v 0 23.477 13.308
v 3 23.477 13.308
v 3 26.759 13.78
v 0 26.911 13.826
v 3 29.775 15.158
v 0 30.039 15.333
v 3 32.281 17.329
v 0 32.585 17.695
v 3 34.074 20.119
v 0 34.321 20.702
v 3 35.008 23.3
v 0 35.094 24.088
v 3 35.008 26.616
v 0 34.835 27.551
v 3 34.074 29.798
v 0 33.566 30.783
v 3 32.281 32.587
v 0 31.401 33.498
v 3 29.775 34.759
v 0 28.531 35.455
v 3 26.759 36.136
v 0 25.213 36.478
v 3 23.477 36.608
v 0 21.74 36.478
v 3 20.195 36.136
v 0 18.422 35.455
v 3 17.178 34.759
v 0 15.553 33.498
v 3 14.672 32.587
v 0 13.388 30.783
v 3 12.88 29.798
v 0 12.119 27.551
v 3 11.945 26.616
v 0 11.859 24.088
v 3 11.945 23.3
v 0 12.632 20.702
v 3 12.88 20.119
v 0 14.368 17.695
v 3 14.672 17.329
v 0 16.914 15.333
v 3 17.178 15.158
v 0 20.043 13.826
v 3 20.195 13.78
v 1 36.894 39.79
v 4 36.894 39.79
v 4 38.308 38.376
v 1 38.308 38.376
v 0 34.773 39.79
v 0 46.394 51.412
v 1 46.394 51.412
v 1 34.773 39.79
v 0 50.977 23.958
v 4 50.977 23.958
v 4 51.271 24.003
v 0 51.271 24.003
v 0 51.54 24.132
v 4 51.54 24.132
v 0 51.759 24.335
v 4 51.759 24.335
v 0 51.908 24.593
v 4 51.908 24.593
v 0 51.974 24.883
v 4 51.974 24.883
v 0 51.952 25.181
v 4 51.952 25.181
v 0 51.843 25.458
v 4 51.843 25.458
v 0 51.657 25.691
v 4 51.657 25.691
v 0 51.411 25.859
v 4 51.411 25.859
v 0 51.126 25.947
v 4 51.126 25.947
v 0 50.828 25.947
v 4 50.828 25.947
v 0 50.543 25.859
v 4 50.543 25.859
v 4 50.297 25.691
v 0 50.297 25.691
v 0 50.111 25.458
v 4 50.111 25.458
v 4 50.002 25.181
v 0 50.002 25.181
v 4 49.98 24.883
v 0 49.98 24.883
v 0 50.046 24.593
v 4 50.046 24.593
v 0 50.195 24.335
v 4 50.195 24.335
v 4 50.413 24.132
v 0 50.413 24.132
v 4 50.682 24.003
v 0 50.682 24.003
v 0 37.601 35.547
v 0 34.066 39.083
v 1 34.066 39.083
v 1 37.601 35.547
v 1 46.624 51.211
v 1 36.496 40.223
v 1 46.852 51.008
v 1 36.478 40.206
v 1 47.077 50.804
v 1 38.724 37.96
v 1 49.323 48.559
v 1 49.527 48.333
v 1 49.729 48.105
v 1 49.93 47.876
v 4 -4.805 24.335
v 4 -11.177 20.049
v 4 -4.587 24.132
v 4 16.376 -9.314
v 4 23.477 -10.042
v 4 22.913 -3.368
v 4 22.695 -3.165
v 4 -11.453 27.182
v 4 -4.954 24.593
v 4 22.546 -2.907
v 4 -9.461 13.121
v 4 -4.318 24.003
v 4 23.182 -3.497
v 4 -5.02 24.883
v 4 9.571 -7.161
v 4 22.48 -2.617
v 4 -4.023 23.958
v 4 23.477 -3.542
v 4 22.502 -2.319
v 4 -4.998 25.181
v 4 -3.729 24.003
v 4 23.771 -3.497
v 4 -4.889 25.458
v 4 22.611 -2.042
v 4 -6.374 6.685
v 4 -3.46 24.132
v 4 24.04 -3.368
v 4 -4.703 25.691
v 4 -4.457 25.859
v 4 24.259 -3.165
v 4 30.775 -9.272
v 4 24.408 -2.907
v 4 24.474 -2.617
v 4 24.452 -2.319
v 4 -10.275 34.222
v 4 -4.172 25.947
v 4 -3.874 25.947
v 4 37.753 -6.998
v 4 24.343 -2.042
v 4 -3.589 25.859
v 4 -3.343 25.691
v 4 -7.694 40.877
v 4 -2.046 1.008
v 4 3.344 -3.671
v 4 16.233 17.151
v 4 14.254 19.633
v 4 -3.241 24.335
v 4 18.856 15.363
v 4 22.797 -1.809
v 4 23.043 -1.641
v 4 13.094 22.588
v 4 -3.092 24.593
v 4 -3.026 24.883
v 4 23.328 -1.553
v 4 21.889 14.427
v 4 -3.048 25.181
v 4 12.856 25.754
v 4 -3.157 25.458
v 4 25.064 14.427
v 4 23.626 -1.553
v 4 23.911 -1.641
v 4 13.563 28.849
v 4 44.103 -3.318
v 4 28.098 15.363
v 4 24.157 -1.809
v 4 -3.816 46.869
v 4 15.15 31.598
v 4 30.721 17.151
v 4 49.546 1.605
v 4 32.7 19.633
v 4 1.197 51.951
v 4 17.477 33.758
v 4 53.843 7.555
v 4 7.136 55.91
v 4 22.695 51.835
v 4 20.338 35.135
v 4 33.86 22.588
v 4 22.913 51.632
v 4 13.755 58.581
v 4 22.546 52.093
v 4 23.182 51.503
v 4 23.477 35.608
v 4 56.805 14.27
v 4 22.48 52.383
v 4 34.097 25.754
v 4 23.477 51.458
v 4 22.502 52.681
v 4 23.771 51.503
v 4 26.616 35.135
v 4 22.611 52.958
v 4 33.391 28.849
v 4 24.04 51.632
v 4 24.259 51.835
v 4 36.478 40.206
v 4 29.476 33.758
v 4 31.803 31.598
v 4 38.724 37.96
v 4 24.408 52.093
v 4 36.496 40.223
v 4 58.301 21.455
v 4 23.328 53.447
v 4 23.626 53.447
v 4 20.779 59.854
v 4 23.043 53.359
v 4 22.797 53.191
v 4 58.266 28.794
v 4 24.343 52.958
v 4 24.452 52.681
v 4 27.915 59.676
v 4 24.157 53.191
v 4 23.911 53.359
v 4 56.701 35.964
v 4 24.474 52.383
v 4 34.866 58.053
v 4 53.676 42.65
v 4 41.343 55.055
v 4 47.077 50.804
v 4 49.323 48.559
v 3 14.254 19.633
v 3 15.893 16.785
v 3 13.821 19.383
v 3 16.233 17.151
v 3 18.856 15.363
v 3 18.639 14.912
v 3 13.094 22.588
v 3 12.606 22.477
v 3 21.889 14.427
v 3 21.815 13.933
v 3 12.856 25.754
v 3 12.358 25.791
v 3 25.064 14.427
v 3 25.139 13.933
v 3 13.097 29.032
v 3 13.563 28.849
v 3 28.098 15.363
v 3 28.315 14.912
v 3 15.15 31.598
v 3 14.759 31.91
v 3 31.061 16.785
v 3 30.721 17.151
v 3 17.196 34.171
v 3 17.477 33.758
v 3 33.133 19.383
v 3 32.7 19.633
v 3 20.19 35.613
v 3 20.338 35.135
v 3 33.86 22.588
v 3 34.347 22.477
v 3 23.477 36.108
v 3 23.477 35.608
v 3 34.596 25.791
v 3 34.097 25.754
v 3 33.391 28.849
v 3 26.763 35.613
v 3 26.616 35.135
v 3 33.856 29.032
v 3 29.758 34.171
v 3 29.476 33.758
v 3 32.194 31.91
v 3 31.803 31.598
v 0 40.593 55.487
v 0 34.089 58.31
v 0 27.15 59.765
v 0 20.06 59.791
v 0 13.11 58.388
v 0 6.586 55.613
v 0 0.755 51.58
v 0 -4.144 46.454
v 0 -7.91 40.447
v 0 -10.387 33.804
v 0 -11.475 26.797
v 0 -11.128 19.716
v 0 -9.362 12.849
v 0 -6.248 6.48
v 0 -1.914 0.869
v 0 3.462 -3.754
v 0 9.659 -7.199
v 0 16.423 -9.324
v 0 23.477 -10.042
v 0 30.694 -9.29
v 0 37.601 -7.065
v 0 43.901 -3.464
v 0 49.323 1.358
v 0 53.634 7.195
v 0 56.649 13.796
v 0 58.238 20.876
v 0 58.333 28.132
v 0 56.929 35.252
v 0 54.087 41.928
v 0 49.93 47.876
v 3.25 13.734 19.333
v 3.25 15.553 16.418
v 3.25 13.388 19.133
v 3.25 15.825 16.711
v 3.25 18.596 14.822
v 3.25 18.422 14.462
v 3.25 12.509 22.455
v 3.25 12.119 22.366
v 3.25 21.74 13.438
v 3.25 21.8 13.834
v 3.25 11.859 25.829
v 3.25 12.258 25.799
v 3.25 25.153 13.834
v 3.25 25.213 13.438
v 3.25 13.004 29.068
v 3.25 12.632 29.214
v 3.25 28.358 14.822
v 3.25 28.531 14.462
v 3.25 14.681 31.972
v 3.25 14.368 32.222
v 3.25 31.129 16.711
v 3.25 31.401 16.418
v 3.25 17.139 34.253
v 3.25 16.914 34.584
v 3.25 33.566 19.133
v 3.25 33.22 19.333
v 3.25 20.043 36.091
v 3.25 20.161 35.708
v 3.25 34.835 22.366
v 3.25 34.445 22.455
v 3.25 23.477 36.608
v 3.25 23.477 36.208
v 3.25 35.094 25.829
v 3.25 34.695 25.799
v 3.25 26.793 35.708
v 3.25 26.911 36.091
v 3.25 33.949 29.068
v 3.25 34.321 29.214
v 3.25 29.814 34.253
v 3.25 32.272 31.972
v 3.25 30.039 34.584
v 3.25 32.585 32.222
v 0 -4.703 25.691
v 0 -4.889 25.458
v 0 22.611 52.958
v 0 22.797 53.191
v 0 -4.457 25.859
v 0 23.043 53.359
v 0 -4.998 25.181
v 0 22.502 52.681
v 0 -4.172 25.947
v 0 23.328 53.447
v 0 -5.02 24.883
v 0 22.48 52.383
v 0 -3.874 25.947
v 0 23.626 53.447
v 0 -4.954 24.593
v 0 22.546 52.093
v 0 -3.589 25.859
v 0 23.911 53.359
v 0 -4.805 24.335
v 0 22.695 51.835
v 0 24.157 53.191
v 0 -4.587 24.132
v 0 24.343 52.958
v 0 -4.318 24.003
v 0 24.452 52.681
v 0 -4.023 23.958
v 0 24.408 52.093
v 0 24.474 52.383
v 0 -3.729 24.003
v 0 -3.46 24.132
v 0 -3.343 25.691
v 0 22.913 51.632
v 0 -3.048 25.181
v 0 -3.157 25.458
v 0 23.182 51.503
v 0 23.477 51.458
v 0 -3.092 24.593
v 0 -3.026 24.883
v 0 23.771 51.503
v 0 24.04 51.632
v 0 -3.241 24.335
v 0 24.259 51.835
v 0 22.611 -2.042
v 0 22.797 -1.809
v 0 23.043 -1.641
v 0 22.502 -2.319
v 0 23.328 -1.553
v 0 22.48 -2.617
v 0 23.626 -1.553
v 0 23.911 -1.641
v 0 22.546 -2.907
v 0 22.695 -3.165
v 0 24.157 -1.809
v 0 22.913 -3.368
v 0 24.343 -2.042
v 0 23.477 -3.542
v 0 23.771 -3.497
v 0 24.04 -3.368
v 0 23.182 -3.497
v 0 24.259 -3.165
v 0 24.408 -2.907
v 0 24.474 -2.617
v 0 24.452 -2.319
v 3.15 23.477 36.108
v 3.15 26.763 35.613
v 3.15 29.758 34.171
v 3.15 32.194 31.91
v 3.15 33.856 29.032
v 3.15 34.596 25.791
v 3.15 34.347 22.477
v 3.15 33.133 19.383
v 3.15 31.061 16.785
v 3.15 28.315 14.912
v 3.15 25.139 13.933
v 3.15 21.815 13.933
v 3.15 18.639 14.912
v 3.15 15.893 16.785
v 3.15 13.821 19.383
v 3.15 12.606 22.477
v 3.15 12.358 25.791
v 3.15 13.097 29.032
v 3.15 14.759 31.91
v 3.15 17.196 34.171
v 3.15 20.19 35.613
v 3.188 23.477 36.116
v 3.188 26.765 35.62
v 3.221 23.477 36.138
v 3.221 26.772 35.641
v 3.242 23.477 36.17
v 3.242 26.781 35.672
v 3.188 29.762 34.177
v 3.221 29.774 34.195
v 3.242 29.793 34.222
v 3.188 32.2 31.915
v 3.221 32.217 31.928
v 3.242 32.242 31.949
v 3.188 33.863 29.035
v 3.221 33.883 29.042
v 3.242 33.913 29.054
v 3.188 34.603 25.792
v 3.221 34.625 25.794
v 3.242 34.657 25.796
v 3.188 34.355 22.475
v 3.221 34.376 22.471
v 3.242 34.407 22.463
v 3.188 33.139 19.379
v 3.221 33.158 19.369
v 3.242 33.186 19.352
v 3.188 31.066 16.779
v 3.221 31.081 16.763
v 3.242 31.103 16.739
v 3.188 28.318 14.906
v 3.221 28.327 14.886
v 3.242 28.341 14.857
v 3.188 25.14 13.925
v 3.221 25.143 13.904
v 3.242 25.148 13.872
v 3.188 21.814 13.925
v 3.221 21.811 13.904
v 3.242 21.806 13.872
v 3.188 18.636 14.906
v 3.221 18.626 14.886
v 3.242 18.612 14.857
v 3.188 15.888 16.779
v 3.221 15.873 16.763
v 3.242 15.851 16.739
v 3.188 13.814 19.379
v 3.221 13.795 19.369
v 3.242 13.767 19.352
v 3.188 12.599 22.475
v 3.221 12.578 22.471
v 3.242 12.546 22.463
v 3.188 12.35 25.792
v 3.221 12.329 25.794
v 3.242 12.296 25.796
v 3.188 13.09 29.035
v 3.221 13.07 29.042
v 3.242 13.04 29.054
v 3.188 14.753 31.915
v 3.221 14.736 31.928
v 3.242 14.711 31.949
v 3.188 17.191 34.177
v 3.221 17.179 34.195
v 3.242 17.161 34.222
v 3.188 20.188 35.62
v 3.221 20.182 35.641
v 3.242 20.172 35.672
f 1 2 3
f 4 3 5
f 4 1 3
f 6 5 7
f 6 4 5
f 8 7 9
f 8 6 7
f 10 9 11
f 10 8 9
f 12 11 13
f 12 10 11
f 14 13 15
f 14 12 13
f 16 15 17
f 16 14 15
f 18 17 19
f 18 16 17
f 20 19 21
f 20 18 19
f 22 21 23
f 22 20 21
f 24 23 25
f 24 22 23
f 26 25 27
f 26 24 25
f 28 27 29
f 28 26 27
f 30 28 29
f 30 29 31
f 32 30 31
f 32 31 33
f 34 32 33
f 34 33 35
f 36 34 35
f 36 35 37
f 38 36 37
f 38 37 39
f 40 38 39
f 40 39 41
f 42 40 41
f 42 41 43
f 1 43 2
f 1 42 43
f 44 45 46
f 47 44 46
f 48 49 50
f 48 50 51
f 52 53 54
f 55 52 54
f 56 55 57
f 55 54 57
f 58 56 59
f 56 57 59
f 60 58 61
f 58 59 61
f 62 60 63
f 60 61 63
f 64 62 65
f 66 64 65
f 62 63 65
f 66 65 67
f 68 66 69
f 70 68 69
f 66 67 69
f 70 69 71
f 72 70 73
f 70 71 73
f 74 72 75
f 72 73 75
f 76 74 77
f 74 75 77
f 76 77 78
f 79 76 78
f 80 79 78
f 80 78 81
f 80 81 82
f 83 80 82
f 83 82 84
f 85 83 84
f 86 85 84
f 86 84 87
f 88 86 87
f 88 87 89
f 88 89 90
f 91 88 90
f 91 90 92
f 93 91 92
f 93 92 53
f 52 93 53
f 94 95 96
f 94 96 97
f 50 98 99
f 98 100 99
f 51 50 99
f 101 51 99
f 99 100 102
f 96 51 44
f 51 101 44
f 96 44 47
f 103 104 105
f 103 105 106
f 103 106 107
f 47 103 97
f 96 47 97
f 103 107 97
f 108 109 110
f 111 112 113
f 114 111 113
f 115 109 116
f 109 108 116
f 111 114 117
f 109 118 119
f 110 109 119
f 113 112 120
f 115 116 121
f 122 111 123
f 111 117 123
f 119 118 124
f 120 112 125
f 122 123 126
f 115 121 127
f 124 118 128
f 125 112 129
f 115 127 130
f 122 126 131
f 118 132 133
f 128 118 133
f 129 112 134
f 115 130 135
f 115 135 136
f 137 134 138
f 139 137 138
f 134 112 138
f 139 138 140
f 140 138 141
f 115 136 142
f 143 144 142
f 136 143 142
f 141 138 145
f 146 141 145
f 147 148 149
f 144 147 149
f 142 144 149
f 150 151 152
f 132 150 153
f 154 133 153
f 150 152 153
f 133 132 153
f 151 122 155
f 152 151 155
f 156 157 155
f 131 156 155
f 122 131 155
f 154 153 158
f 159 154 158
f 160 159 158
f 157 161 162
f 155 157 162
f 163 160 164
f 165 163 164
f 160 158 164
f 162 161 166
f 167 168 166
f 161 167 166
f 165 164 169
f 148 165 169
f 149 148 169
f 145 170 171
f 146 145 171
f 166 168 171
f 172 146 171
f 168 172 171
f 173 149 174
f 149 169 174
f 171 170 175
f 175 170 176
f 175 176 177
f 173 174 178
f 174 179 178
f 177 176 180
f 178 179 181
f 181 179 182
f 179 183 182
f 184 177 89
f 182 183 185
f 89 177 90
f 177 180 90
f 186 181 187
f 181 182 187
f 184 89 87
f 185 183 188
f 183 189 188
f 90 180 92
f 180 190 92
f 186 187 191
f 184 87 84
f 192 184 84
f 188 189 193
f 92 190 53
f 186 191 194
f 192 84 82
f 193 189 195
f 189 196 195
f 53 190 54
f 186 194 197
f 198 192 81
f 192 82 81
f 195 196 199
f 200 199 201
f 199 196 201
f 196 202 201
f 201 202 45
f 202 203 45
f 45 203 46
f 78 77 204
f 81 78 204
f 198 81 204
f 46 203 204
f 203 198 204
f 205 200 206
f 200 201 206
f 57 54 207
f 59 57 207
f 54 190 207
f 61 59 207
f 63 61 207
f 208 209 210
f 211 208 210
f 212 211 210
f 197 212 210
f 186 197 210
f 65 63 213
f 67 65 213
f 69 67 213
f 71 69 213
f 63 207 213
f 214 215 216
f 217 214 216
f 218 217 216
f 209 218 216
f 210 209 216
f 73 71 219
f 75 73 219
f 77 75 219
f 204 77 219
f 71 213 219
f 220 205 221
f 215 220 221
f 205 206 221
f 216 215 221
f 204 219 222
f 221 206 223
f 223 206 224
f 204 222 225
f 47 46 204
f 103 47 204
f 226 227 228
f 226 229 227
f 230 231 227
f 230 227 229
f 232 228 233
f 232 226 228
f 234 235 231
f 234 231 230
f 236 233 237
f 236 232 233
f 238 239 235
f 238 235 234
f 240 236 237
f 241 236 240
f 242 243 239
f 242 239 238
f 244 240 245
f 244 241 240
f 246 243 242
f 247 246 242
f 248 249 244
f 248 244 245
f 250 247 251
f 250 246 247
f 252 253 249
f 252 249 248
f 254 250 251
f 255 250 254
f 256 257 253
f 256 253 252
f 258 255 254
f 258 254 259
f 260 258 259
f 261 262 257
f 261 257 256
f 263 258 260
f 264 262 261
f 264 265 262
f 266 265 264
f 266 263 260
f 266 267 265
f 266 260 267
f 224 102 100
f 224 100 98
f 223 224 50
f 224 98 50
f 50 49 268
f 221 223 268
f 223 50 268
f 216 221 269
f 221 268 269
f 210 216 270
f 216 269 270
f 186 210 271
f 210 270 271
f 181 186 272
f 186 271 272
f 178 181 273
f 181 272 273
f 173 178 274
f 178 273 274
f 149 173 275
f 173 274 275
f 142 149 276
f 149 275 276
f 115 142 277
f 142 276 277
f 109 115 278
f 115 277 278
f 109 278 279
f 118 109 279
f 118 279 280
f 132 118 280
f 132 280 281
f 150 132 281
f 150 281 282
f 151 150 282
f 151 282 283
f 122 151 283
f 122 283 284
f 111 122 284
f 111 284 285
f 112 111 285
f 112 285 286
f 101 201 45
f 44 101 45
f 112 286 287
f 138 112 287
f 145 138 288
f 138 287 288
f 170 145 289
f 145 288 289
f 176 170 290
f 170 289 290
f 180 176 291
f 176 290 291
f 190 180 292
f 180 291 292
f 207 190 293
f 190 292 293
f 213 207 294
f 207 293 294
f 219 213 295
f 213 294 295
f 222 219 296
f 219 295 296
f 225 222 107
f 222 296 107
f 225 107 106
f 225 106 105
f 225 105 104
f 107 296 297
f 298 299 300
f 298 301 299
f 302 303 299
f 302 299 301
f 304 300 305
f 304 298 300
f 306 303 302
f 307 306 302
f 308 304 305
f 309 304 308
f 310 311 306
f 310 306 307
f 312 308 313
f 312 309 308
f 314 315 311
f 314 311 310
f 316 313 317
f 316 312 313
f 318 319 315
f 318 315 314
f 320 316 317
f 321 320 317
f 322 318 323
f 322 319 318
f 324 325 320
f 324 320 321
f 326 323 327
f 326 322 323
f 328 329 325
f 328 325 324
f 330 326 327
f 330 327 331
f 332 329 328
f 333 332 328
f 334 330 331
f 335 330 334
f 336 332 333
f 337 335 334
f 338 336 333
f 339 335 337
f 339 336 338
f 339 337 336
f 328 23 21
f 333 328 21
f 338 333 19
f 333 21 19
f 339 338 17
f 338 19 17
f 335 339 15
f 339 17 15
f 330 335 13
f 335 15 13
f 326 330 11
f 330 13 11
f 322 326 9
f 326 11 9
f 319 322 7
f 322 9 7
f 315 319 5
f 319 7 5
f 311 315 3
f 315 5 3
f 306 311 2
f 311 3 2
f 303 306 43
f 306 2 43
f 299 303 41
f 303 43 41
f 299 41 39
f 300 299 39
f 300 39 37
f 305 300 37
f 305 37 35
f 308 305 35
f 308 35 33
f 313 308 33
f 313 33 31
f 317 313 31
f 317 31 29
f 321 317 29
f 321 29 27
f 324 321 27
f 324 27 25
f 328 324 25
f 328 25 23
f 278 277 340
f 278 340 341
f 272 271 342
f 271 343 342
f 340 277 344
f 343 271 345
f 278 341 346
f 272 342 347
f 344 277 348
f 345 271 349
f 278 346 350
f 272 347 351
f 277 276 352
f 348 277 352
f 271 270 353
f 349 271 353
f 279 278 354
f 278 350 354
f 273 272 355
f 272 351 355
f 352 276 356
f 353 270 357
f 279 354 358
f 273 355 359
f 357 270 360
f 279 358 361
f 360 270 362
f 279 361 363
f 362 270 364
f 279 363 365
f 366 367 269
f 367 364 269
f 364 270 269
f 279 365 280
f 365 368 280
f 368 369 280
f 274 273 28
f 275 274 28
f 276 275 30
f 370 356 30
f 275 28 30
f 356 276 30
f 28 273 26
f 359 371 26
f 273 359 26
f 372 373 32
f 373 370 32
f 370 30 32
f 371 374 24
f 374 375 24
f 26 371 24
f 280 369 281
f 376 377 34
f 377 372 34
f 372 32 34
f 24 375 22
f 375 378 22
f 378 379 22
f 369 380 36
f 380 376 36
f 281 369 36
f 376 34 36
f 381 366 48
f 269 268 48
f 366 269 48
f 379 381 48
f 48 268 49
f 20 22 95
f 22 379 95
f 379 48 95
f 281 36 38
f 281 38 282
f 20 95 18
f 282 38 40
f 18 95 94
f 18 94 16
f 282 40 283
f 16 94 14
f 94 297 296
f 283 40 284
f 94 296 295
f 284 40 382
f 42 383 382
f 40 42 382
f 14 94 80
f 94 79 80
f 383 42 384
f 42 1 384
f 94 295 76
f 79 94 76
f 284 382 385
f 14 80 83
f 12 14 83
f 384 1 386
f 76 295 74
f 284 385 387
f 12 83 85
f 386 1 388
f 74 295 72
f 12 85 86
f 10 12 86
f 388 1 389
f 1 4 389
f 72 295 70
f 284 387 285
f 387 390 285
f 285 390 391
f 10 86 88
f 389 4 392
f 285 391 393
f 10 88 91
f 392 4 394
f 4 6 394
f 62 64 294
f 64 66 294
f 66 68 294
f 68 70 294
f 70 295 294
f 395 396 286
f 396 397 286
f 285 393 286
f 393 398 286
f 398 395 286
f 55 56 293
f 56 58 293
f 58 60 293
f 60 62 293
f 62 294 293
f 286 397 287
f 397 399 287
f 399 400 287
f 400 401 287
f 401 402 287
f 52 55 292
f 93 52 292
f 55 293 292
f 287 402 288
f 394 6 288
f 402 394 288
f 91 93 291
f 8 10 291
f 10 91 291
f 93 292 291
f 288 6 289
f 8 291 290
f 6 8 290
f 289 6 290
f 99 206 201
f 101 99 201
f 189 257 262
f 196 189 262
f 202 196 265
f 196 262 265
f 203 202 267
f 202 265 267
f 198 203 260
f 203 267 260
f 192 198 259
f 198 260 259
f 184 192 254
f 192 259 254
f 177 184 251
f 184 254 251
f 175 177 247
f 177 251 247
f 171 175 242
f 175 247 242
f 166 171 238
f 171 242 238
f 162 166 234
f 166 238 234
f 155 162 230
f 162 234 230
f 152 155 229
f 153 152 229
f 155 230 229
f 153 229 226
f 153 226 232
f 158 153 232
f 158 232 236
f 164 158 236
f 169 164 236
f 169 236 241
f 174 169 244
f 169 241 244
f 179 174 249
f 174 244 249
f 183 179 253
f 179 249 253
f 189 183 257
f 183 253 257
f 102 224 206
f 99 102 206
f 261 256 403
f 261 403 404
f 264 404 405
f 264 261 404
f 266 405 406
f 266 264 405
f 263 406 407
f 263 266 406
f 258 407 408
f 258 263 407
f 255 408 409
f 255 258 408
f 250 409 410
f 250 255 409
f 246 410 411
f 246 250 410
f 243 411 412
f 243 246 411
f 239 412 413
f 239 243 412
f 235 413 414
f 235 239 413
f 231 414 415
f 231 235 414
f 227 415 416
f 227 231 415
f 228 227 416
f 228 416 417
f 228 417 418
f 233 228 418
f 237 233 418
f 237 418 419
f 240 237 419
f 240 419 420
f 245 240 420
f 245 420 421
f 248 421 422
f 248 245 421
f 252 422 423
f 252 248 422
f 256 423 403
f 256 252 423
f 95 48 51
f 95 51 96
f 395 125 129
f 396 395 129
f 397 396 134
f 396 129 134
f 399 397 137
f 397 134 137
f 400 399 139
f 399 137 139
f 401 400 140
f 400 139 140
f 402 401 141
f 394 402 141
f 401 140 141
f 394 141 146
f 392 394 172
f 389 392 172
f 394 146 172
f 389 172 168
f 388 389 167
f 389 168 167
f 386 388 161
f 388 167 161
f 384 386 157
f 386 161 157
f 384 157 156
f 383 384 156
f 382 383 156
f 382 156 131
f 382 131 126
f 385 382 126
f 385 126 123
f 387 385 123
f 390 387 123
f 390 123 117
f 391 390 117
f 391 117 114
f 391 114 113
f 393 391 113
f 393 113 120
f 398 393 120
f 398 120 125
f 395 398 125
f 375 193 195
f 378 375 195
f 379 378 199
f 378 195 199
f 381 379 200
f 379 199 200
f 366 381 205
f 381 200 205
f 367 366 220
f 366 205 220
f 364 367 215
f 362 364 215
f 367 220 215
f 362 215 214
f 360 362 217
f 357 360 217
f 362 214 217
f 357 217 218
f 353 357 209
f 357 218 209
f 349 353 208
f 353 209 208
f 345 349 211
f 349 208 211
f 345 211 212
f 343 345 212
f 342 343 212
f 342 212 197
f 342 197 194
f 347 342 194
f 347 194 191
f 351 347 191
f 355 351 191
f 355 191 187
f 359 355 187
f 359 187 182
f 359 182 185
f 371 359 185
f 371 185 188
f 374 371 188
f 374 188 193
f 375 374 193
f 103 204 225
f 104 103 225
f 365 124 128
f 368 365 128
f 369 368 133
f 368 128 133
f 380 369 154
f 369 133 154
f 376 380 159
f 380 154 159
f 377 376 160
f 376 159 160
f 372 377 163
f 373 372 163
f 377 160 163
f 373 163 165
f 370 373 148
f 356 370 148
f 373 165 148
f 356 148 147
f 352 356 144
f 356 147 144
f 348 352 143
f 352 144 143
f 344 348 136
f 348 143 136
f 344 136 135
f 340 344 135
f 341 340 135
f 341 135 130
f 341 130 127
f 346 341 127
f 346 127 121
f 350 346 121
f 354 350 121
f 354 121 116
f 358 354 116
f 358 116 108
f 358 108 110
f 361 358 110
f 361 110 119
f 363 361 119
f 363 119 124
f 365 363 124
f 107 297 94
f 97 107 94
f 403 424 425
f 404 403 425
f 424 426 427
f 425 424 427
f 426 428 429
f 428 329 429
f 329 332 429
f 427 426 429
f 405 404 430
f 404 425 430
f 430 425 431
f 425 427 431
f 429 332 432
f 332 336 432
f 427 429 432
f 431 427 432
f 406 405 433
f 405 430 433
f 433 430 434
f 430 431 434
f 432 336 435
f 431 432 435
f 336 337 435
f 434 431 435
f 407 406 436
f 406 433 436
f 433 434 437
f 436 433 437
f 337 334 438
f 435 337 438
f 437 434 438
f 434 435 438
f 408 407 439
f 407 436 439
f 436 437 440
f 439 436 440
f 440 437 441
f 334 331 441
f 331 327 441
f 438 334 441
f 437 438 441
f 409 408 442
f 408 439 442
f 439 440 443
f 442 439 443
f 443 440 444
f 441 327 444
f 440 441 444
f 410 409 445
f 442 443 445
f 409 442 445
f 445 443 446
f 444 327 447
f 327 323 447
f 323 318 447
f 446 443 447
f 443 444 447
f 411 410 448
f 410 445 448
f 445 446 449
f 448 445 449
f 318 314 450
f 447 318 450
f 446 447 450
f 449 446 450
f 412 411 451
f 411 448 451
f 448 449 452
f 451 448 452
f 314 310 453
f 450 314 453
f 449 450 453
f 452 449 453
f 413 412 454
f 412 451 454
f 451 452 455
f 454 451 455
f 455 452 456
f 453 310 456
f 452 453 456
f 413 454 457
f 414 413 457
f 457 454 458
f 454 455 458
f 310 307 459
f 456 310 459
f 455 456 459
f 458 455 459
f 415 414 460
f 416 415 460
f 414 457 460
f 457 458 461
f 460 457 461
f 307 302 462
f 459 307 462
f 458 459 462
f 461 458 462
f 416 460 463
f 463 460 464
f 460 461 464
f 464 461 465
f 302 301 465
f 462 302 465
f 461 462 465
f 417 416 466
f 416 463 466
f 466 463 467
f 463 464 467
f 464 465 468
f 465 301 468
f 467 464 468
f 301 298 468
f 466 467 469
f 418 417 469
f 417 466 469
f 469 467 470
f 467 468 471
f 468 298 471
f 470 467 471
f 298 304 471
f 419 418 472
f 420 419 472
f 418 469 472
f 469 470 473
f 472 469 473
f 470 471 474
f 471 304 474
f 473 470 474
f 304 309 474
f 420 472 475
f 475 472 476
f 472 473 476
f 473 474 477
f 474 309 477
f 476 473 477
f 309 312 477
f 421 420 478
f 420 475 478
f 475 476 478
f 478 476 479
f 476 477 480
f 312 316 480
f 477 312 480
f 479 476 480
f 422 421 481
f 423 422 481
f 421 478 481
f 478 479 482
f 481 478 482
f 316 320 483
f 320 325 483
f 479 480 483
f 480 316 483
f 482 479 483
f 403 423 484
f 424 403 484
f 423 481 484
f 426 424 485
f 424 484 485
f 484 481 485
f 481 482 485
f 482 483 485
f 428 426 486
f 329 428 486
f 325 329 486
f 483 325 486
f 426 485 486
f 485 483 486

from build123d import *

# Parameters (mm, degrees)
SKETCH1_R           = 35
SKETCH1_R_2         = 11.65
BOSS_EXTRUDE1_DEPTH = 4
CUT_EXTRUDE1_DEPTH  = 10
SKETCH6_R           = 1
CUT_EXTRUDE4_DEPTH  = 10
BOSS_EXTRUDE3_START = 1
SKETCH7_R           = 11.65
SKETCH7_R_2         = 10.65
BOSS_EXTRUDE3_DEPTH = 1
SKETCH8_R           = 11.65
SKETCH8_R_2         = 11.15
CUT_EXTRUDE5_DEPTH  = 0.25
FILLET1_R           = 0.1
CUT_EXTRUDE6_DEPTH  = 1
CUT_EXTRUDE12_DEPTH = 6


with BuildPart() as part:
    # Sketch1 → Boss-Extrude1 (new body)
    with BuildSketch(Plane(origin=(0, 0, 0), x_dir=(0, -0.16775650988153862, -0.9858284604292805), z_dir=(1, 0, 0))):
        with Locations(Location((-28.542888787, 18.957113921, 0), (0, 0, 9.65740334))):
            Circle(SKETCH1_R)
        with Locations(Location((-28.542888787, 18.957113921, 0), (0, 0, 9.65740334))):
            Circle(SKETCH1_R_2, mode=Mode.SUBTRACT)
    extrude(amount=BOSS_EXTRUDE1_DEPTH)

    # Sketch2 → Cut-Extrude1 (cut)
    with BuildSketch(Plane.ZY):
        with BuildLine():
            Line((38.375552951, 38.308271509), (48.999843401, 48.932561958))
            Line((48.999843401, 48.932561958), (51.312030188, 52.930544456))
            Line((51.312030188, 52.930544456), (54.007279042, 51.111570475))
            Line((54.007279042, 51.111570475), (50.414056963, 47.518348396))
            Line((50.414056963, 47.518348396), (39.789766514, 36.894057946))
            ThreePointArc((39.789766514, 36.894057946), (39.100348464, 37.618853459), (38.375552951, 38.308271509))
        make_face()
    extrude(amount=-CUT_EXTRUDE1_DEPTH, mode=Mode.SUBTRACT)

    # Sketch6 → Cut-Extrude4 (cut)
    with BuildSketch(Plane(origin=(4, 0, 0), x_dir=(0, 0, -1), z_dir=(1, 0, 0))):
        with Locations((-24.958212841, -4.023282164)):
            Circle(SKETCH6_R)
        with Locations((2.541787159, 23.476717836)):
            Circle(SKETCH6_R)
        with Locations((-52.458212841, 23.476717836)):
            Circle(SKETCH6_R)
        with Locations((-24.958212841, 50.976717836)):
            Circle(SKETCH6_R)
    extrude(amount=-CUT_EXTRUDE4_DEPTH, mode=Mode.SUBTRACT)

    # Sketch7 → Boss-Extrude3 (add)
    with BuildSketch(Plane.ZY.offset(-4).offset(BOSS_EXTRUDE3_START)):
        with Locations((24.958212841, 23.476717836)):
            Circle(SKETCH7_R)
        with Locations((24.958212841, 23.476717836)):
            Circle(SKETCH7_R_2, mode=Mode.SUBTRACT)
    extrude(amount=-BOSS_EXTRUDE3_DEPTH)

    # Sketch8 → Cut-Extrude5 (cut)
    with BuildSketch(Plane.ZY.offset(-3)):
        with Locations((24.958212841, 23.476717836)):
            Circle(SKETCH8_R)
        with Locations((24.958212841, 23.476717836)):
            Circle(SKETCH8_R_2, mode=Mode.SUBTRACT)
    extrude(amount=-CUT_EXTRUDE5_DEPTH, mode=Mode.SUBTRACT)

    # Fillet1
    fillet1_edges = [part.edges().sort_by_distance(p)[0] for p in [
        (3.25, 23.476717836, 13.808212841),
    ]]
    fillet(fillet1_edges, radius=FILLET1_R)

    # Sketch9 → Cut-Extrude6 (cut)
    with BuildSketch(Plane.ZY):
        Polygon((36.254232608, 38.308271509), (48.989739813, 51.043778714), (52.525273719, 47.508244808), (39.789766514, 34.772737603), (39.082659732, 34.065630822), (35.547125827, 37.601164728), align=None)
        Polygon((48.989739813, 48.922458371), (50.403953376, 47.508244808), (40.402946038, 37.507237471), (38.988732476, 38.921451033), align=None, mode=Mode.SUBTRACT)
    extrude(amount=-CUT_EXTRUDE6_DEPTH, mode=Mode.SUBTRACT)

    # Sketch15 → Cut-Extrude12 (cut)
    with BuildSketch(Plane(origin=(4, 2.265244421, 47.825710378), x_dir=(0, 0, -1), z_dir=(1, 0, 0))):
        Polygon((7.620004071, 34.212873731), (9.865582661, 36.458452321), (9.847893929, 36.476141053), (-10.673980141, 56.998015123), (-12.919044171, 54.752951093), (7.602829899, 34.231077023), align=None)
    extrude(amount=-CUT_EXTRUDE12_DEPTH, mode=Mode.SUBTRACT)


solid = part.part
